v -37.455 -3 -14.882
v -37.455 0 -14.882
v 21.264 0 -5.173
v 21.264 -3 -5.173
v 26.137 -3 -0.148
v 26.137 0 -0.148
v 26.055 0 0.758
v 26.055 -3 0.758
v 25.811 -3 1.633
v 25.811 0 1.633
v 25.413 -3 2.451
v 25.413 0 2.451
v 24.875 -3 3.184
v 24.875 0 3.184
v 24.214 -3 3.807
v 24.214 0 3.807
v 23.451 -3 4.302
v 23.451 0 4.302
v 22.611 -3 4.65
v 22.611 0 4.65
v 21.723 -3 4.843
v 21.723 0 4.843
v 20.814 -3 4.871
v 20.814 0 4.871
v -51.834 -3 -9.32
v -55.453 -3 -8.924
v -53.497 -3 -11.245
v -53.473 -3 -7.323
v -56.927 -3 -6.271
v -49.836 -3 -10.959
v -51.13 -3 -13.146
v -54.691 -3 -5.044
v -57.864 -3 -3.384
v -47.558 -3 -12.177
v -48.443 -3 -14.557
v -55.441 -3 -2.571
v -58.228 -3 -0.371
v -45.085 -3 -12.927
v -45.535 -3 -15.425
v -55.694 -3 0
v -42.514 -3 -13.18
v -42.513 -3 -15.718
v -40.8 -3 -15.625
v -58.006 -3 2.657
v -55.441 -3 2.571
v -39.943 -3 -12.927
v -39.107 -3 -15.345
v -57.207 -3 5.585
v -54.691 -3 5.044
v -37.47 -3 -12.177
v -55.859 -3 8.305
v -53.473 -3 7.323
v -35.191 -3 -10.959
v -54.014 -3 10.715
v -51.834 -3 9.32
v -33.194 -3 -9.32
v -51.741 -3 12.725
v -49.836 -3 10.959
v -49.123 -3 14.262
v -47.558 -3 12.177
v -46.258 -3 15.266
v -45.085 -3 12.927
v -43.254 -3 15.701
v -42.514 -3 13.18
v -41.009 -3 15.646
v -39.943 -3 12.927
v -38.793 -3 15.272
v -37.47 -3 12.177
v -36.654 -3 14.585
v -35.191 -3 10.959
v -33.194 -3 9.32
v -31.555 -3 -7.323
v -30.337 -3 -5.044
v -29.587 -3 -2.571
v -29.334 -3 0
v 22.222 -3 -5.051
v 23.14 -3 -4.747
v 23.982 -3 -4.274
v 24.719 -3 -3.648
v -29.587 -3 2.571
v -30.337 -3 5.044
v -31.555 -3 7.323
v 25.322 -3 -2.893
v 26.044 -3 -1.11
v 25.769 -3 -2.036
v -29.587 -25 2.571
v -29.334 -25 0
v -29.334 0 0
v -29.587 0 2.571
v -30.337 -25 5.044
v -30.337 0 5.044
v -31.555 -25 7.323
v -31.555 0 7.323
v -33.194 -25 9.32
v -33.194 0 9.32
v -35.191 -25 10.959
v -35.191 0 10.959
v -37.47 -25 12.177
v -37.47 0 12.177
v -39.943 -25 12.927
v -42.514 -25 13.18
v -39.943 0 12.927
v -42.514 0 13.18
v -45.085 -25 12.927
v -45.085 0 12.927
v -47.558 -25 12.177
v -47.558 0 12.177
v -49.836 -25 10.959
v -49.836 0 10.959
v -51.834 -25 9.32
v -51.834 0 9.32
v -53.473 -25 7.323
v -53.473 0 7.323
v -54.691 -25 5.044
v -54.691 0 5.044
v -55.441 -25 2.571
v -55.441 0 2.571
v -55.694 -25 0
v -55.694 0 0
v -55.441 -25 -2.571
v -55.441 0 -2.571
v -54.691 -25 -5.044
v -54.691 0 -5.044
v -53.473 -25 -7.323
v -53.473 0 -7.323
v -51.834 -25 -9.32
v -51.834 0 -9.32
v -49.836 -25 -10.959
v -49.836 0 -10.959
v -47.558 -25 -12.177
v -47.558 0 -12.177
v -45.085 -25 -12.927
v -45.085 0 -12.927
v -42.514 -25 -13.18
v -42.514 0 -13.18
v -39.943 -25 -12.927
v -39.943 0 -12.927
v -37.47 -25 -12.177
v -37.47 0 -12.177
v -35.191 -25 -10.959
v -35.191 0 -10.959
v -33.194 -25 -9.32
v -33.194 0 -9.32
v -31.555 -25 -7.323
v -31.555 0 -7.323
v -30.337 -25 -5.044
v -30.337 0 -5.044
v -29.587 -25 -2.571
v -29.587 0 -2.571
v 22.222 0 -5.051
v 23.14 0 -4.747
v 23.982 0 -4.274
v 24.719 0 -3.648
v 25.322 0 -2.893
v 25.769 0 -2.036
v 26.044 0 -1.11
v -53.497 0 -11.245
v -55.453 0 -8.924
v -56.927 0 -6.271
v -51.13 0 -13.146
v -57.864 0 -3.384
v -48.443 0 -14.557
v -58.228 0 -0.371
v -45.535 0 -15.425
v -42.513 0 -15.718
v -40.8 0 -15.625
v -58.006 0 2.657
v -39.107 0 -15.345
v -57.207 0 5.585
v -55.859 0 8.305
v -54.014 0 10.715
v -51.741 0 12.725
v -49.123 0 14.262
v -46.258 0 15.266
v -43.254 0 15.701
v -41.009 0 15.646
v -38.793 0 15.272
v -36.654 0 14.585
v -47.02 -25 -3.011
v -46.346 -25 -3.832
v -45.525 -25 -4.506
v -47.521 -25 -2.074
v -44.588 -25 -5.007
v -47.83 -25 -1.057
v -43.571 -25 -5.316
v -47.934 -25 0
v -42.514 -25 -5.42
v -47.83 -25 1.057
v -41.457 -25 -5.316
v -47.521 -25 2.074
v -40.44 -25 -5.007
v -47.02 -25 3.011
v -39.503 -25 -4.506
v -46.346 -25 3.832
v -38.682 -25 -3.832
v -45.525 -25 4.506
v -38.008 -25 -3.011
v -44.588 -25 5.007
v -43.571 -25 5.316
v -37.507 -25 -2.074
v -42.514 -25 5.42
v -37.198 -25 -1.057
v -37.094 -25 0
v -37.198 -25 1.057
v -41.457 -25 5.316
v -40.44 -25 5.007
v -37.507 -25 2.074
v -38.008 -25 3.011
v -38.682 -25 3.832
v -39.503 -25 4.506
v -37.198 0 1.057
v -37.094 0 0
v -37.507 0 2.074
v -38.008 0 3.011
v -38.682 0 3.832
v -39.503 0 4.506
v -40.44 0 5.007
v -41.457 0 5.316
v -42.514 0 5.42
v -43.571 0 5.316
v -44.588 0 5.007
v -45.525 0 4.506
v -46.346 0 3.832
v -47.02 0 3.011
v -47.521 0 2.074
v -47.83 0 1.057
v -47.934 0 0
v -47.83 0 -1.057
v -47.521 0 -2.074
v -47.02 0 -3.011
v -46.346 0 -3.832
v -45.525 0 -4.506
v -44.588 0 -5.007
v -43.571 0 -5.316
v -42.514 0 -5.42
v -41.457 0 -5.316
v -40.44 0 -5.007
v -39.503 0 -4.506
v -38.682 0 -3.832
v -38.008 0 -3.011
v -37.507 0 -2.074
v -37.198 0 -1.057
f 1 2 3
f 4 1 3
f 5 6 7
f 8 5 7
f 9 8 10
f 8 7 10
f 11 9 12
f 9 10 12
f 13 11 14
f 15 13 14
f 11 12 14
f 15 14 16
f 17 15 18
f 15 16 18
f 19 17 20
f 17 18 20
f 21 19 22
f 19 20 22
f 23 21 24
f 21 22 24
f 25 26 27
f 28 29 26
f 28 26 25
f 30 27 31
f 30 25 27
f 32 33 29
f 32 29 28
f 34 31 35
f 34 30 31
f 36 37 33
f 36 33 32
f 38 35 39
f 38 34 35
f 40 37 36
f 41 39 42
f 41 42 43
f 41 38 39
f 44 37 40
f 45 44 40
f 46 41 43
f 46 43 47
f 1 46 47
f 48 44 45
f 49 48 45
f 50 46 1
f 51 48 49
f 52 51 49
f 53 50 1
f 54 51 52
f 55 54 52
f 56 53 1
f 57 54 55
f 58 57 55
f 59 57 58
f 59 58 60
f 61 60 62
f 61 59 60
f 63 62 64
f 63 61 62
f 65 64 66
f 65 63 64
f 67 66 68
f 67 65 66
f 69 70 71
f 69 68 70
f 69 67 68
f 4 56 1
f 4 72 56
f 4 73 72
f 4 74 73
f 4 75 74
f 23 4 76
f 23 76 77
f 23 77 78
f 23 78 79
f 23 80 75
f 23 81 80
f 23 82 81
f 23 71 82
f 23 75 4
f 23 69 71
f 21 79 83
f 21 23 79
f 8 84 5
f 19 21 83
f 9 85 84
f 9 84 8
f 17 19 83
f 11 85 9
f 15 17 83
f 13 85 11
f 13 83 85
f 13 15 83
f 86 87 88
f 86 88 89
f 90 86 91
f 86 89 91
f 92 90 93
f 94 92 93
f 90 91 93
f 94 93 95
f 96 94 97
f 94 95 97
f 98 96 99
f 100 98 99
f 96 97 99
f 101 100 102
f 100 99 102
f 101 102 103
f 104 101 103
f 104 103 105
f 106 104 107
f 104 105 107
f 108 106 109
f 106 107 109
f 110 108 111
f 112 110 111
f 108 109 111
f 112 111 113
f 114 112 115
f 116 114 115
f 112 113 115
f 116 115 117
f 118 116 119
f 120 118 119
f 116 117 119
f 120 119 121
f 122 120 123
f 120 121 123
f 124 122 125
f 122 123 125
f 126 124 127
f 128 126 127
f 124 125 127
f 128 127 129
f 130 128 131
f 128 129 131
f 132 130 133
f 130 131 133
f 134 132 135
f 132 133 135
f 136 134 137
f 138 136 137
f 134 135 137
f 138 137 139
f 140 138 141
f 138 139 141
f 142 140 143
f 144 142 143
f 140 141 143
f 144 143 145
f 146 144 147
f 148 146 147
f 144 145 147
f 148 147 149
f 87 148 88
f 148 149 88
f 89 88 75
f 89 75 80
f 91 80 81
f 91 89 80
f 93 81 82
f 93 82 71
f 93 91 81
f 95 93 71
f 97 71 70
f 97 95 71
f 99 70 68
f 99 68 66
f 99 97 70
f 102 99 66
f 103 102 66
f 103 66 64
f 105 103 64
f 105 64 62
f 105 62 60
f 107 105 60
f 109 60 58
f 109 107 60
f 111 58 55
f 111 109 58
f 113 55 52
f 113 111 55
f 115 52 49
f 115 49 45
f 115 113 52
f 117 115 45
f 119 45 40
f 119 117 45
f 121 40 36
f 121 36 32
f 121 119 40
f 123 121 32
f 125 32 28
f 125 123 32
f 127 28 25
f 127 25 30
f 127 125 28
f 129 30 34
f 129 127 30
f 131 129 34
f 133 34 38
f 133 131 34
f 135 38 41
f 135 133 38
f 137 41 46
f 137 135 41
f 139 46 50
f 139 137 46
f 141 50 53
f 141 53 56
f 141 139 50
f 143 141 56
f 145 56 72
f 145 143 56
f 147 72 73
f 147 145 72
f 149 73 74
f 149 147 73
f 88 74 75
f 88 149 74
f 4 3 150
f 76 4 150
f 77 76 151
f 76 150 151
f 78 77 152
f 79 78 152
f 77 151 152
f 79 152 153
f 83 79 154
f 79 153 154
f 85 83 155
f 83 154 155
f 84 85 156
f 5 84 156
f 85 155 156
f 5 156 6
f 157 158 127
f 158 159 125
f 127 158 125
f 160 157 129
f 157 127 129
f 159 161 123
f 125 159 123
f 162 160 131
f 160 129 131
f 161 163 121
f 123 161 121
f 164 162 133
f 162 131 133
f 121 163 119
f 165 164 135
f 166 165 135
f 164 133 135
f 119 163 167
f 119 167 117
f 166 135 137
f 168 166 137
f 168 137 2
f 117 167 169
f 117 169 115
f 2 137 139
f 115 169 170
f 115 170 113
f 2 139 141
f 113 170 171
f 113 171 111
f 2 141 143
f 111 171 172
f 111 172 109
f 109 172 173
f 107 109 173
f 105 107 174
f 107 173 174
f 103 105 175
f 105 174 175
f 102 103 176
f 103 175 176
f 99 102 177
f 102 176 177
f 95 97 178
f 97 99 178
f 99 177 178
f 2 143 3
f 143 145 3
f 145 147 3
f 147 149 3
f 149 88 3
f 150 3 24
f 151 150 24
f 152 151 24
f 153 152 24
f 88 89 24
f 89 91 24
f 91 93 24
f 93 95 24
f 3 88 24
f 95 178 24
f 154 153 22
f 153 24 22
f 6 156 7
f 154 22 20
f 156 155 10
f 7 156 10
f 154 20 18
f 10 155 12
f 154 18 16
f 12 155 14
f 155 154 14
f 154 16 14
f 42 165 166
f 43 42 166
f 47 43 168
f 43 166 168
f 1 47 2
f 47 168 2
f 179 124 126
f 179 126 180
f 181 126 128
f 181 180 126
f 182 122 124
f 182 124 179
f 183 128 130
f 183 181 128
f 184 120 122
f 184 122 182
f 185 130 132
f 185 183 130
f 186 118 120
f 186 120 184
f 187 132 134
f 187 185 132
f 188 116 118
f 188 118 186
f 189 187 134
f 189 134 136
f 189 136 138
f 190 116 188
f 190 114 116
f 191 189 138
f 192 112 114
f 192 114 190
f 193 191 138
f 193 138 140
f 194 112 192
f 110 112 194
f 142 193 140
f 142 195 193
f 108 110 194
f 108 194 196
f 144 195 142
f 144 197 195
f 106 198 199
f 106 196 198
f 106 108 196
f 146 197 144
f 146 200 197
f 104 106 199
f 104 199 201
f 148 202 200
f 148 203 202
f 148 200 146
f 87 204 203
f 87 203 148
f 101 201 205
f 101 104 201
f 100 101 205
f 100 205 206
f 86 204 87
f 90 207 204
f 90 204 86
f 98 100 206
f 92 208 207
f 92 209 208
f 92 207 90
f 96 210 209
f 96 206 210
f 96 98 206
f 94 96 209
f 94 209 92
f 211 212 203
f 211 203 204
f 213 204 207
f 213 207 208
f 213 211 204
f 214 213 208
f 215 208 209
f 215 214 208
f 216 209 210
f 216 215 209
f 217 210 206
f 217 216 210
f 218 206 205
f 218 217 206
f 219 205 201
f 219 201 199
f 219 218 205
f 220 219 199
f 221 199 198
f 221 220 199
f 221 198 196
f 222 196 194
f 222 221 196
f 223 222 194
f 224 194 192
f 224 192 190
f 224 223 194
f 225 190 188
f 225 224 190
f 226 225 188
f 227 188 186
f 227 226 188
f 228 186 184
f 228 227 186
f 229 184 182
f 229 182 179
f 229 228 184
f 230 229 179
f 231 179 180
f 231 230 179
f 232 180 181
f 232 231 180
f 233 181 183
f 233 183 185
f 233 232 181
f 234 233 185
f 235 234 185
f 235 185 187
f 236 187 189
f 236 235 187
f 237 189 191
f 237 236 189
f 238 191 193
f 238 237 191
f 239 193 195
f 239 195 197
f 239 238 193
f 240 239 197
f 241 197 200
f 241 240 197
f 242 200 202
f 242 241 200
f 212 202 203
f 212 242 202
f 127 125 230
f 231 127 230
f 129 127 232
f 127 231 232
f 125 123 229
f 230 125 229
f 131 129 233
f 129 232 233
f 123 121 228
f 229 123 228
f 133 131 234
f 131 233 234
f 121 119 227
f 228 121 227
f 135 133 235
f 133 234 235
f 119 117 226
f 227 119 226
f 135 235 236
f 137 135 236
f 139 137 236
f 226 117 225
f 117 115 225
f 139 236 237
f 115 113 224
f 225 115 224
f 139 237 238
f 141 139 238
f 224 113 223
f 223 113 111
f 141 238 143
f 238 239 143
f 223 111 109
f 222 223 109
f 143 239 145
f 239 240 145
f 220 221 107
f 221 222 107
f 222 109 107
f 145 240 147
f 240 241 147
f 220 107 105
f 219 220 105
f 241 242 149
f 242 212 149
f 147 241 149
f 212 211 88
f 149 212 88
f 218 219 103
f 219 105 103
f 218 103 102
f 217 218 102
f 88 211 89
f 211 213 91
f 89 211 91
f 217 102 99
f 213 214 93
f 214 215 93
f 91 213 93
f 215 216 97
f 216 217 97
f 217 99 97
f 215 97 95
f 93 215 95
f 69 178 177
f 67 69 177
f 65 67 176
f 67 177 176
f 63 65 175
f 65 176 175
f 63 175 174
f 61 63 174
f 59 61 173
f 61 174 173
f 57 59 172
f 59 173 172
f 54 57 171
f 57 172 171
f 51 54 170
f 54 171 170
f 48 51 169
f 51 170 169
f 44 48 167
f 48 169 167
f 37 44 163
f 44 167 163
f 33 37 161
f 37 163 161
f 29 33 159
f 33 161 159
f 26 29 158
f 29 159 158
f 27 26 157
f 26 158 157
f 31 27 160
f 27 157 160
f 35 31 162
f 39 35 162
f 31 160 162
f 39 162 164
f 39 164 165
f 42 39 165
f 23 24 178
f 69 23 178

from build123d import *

# Parameters (mm, degrees)
F0_R     = 13.1802136703
F0_R_2   = 5.4198051915
F1_DEPTH = 25
F2_DEPTH = 3


# Not quite as in the source:
# - the program builds the solid bodies; features that only make, move or delete a surface that nothing else refers to are left out


with BuildPart() as f1:
    # F0 (on Front) → F1 (new body)
    with BuildSketch(Plane.XZ):
        with Locations((-42.5139516592, 0)):
            Circle(F0_R)
        with Locations((-42.5139516592, 0)):
            Circle(F0_R_2, mode=Mode.SUBTRACT)
    extrude(amount=F1_DEPTH)


with BuildPart() as f2:
    # F0 (on Front) → F2 (new body)
    with BuildSketch(Plane.XZ):
        with BuildLine():
            Line((20.8140872557, 4.8713734487), (-36.6541866123, 14.585258601))
            ThreePointArc((-36.6541866123, 14.585258601), (-29.4914236938, 8.8022940336), (-26.7955988555, 0))
            ThreePointArc((-26.7955988555, 0), (-29.7352710301, -9.1527010353), (-37.454722911, -14.8818956903))
            Line((-37.454722911, -14.8818956903), (21.2636660443, -5.1729371042))
            ThreePointArc((21.2636660443, -5.1729371042), (16.0867370449, -0.3724373523), (20.8140872557, 4.8713734487))
        make_face()
        with BuildLine():
            Line((-37.454722911, -14.8818956903), (-42.5134955187, -15.7183527971))
            ThreePointArc((-42.5134955187, -15.7183527971), (-39.9497718846, -15.5077914916), (-37.454722911, -14.8818956903))
        make_face()
        with BuildLine():
            ThreePointArc((26.1370662263, -0.1476258039), (24.5585090431, 3.5103947885), (20.8140872557, 4.8713734487))
            ThreePointArc((20.8140872557, 4.8713734487), (16.0867370449, -0.3724373523), (21.2636660443, -5.1729371042))
            ThreePointArc((21.2636660443, -5.1729371042), (24.7186267901, -3.6477609084), (26.1370662263, -0.1476258039))
        make_face()
        with BuildLine():
            ThreePointArc((-36.6541866123, 14.585258601), (-39.8942330305, 15.4985060302), (-43.2544350848, 15.7009012212))
            Line((-43.2544350848, 15.7009012212), (-36.6541866123, 14.585258601))
        make_face()
        with BuildLine():
            Line((-36.6541866123, 14.585258601), (-43.2544350848, 15.7009012212))
            ThreePointArc((-43.2544350848, 15.7009012212), (-58.2279355864, -0.3705725294), (-42.5134955187, -15.7183527971))
            Line((-42.5134955187, -15.7183527971), (-37.454722911, -14.8818956903))
            ThreePointArc((-37.454722911, -14.8818956903), (-29.7352710301, -9.1527010353), (-26.7955988555, 0))
            ThreePointArc((-26.7955988555, 0), (-29.4914236938, 8.8022940336), (-36.6541866123, 14.585258601))
        make_face()
        with Locations((-42.5139516592, 0)):
            Circle(F0_R, mode=Mode.SUBTRACT)
    extrude(amount=F2_DEPTH)


solid = Compound([f1.part, f2.part])
